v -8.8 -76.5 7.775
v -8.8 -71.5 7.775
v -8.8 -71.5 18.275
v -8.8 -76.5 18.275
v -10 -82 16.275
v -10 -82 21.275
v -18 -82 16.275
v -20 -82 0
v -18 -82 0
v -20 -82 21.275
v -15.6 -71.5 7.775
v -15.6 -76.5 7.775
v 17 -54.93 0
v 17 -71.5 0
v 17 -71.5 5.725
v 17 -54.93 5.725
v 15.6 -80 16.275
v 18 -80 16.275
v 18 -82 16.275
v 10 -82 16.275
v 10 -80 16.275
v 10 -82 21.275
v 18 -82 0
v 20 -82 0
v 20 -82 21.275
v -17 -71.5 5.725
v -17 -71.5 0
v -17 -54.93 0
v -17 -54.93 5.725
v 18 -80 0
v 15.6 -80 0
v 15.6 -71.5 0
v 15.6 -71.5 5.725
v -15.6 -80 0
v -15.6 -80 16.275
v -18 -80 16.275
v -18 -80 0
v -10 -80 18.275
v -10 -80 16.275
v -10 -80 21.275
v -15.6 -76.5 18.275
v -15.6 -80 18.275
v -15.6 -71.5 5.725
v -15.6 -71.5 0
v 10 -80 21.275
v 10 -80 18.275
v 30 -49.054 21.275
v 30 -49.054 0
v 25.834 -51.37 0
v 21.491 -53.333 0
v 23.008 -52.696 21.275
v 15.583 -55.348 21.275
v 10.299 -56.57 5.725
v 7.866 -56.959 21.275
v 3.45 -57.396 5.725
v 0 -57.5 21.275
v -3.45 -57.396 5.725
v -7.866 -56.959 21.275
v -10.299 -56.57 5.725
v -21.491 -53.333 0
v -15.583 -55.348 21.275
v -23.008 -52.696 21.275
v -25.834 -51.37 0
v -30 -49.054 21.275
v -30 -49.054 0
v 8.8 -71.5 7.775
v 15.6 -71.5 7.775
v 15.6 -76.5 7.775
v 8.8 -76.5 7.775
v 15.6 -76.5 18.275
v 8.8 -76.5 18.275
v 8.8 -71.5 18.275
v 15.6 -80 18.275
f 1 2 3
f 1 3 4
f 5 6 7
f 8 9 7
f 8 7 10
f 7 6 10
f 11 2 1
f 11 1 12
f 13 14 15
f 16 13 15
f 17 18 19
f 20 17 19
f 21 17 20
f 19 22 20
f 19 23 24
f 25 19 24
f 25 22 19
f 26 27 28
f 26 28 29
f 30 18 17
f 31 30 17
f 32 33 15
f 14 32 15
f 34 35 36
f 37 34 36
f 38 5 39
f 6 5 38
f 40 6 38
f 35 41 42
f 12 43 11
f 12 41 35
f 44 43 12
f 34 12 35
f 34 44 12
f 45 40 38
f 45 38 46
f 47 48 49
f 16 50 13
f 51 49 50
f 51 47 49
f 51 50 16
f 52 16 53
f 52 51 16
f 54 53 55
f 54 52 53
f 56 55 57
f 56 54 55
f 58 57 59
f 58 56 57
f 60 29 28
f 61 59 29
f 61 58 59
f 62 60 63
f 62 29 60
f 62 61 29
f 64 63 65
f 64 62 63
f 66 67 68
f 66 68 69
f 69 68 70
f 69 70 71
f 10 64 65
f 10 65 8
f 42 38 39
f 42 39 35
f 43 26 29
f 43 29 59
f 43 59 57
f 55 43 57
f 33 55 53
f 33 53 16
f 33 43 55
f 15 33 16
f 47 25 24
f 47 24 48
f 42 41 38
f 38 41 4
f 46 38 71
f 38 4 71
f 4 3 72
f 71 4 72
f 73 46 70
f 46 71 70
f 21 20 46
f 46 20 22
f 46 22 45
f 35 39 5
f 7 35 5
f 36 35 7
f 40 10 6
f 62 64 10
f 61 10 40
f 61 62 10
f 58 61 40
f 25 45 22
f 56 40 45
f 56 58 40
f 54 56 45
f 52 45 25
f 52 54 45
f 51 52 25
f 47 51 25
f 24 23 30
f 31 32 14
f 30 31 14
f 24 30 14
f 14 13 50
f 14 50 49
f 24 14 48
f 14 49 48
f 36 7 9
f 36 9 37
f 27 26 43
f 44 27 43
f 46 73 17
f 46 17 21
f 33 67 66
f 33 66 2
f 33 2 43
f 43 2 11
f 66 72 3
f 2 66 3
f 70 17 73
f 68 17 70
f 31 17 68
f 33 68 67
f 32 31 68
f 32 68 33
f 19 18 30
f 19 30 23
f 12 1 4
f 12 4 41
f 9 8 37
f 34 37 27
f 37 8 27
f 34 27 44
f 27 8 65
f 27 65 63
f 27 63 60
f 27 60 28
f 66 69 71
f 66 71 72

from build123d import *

# Parameters (mm, degrees)
BOSS_EXTRU_1_DEPTH      = 18.275
ESQUISSE2_W             = 40
ESQUISSE2_H             = 22
BOSS_EXTRU_2_DEPTH      = 3
ESQUISSE3_W             = 40
ESQUISSE3_H             = 2
BOSS_EXTRU_3_DEPTH      = 2
ESQUISSE4_W             = 20
ESQUISSE4_H             = 2
ENL_V_MAT_EXTRU_2_DEPTH = 22.275
ENL_V_START             = -7.775
ESQUISSE5_W             = 31.2
ESQUISSE5_H             = 5
ENL_V_MAT_EXTRU_3_DEPTH = 7.775
ESQUISSE6_W             = 34
ESQUISSE6_H             = 5.725
ENL_V_MAT_EXTRU_4_DEPTH = 12.5
BOSS_EXTRU_4_DEPTH      = 21.275
ESQUISSE8_W             = 34
ESQUISSE8_H             = 5.725
ENL_V_MAT_EXTRU_5_DEPTH = 11.946457824


with BuildPart() as part:
    # Esquisse1 → Boss.-Extru.1 (new body)
    with BuildSketch(Plane.XY):
        Polygon((-15.6, -80), (-20, -80), (-20, -60), (20, -60), (20, -80), (15.6, -80), (15.6, -76.5), (8.8, -76.5), (8.8, -71.5), (-8.8, -71.5), (-8.8, -76.5), (-15.6, -76.5), align=None)
    extrude(amount=BOSS_EXTRU_1_DEPTH)

    # Esquisse2 → Boss.-Extru.2 (add)
    with BuildSketch(Plane.XY.offset(18.275)):
        with Locations((0, -71)):
            Rectangle(ESQUISSE2_W, ESQUISSE2_H)
    extrude(amount=BOSS_EXTRU_2_DEPTH)

    # Esquisse3 → Boss.-Extru.3 (add)
    with BuildSketch(Plane(origin=(0, 0, 18.275), x_dir=(-1, 0, 0), z_dir=(0, 0, -1))):
        with Locations((0, -81)):
            Rectangle(ESQUISSE3_W, ESQUISSE3_H)
    extrude(amount=BOSS_EXTRU_3_DEPTH)

    # Esquisse4 → Enlèv. mat.-Extru.2 (cut, through all)
    with BuildSketch(Plane.XY.offset(21.275)):
        with Locations((0, -81)):
            Rectangle(ESQUISSE4_W, ESQUISSE4_H)
    extrude(amount=-ENL_V_MAT_EXTRU_2_DEPTH, mode=Mode.SUBTRACT)

    # Esquisse5 → Enlèv. mat.-Extru.3 (cut)
    with BuildSketch(Plane(origin=(0, 0, 0), x_dir=(-1, 0, 0), z_dir=(0, 0, -1)).offset(ENL_V_START)):
        with Locations((0, -74)):
            Rectangle(ESQUISSE5_W, ESQUISSE5_H)
    extrude(amount=ENL_V_MAT_EXTRU_3_DEPTH, mode=Mode.SUBTRACT)

    # Esquisse6 → Enlèv. mat.-Extru.4 (cut, through all)
    with BuildSketch(Plane.XZ.offset(71.5)):
        with Locations((0, 2.8625)):
            Rectangle(ESQUISSE6_W, ESQUISSE6_H)
    extrude(amount=-ENL_V_MAT_EXTRU_4_DEPTH, mode=Mode.SUBTRACT)

    # Esquisse7 → Boss.-Extru.4 (add)
    with BuildSketch(Plane.XY.offset(21.275)):
        with BuildLine():
            Line((-30, -49.053542176), (-20, -82))
            Line((-20, -82), (-18, -82))
            Line((-18, -82), (-18, -60))
            Line((-18, -60), (18, -60))
            Line((18, -60), (18, -82))
            Line((18, -82), (20, -82))
            Line((20, -82), (30, -49.053542176))
            ThreePointArc((30, -49.053542176), (0, -57.5), (-30, -49.053542176))
        make_face()
    extrude(amount=-BOSS_EXTRU_4_DEPTH)

    # Esquisse8 → Enlèv. mat.-Extru.5 (cut, through all)
    with BuildSketch(Plane.XZ.offset(60)):
        with Locations((0, 2.8625)):
            Rectangle(ESQUISSE8_W, ESQUISSE8_H)
    extrude(amount=-ENL_V_MAT_EXTRU_5_DEPTH, mode=Mode.SUBTRACT)


solid = part.part
